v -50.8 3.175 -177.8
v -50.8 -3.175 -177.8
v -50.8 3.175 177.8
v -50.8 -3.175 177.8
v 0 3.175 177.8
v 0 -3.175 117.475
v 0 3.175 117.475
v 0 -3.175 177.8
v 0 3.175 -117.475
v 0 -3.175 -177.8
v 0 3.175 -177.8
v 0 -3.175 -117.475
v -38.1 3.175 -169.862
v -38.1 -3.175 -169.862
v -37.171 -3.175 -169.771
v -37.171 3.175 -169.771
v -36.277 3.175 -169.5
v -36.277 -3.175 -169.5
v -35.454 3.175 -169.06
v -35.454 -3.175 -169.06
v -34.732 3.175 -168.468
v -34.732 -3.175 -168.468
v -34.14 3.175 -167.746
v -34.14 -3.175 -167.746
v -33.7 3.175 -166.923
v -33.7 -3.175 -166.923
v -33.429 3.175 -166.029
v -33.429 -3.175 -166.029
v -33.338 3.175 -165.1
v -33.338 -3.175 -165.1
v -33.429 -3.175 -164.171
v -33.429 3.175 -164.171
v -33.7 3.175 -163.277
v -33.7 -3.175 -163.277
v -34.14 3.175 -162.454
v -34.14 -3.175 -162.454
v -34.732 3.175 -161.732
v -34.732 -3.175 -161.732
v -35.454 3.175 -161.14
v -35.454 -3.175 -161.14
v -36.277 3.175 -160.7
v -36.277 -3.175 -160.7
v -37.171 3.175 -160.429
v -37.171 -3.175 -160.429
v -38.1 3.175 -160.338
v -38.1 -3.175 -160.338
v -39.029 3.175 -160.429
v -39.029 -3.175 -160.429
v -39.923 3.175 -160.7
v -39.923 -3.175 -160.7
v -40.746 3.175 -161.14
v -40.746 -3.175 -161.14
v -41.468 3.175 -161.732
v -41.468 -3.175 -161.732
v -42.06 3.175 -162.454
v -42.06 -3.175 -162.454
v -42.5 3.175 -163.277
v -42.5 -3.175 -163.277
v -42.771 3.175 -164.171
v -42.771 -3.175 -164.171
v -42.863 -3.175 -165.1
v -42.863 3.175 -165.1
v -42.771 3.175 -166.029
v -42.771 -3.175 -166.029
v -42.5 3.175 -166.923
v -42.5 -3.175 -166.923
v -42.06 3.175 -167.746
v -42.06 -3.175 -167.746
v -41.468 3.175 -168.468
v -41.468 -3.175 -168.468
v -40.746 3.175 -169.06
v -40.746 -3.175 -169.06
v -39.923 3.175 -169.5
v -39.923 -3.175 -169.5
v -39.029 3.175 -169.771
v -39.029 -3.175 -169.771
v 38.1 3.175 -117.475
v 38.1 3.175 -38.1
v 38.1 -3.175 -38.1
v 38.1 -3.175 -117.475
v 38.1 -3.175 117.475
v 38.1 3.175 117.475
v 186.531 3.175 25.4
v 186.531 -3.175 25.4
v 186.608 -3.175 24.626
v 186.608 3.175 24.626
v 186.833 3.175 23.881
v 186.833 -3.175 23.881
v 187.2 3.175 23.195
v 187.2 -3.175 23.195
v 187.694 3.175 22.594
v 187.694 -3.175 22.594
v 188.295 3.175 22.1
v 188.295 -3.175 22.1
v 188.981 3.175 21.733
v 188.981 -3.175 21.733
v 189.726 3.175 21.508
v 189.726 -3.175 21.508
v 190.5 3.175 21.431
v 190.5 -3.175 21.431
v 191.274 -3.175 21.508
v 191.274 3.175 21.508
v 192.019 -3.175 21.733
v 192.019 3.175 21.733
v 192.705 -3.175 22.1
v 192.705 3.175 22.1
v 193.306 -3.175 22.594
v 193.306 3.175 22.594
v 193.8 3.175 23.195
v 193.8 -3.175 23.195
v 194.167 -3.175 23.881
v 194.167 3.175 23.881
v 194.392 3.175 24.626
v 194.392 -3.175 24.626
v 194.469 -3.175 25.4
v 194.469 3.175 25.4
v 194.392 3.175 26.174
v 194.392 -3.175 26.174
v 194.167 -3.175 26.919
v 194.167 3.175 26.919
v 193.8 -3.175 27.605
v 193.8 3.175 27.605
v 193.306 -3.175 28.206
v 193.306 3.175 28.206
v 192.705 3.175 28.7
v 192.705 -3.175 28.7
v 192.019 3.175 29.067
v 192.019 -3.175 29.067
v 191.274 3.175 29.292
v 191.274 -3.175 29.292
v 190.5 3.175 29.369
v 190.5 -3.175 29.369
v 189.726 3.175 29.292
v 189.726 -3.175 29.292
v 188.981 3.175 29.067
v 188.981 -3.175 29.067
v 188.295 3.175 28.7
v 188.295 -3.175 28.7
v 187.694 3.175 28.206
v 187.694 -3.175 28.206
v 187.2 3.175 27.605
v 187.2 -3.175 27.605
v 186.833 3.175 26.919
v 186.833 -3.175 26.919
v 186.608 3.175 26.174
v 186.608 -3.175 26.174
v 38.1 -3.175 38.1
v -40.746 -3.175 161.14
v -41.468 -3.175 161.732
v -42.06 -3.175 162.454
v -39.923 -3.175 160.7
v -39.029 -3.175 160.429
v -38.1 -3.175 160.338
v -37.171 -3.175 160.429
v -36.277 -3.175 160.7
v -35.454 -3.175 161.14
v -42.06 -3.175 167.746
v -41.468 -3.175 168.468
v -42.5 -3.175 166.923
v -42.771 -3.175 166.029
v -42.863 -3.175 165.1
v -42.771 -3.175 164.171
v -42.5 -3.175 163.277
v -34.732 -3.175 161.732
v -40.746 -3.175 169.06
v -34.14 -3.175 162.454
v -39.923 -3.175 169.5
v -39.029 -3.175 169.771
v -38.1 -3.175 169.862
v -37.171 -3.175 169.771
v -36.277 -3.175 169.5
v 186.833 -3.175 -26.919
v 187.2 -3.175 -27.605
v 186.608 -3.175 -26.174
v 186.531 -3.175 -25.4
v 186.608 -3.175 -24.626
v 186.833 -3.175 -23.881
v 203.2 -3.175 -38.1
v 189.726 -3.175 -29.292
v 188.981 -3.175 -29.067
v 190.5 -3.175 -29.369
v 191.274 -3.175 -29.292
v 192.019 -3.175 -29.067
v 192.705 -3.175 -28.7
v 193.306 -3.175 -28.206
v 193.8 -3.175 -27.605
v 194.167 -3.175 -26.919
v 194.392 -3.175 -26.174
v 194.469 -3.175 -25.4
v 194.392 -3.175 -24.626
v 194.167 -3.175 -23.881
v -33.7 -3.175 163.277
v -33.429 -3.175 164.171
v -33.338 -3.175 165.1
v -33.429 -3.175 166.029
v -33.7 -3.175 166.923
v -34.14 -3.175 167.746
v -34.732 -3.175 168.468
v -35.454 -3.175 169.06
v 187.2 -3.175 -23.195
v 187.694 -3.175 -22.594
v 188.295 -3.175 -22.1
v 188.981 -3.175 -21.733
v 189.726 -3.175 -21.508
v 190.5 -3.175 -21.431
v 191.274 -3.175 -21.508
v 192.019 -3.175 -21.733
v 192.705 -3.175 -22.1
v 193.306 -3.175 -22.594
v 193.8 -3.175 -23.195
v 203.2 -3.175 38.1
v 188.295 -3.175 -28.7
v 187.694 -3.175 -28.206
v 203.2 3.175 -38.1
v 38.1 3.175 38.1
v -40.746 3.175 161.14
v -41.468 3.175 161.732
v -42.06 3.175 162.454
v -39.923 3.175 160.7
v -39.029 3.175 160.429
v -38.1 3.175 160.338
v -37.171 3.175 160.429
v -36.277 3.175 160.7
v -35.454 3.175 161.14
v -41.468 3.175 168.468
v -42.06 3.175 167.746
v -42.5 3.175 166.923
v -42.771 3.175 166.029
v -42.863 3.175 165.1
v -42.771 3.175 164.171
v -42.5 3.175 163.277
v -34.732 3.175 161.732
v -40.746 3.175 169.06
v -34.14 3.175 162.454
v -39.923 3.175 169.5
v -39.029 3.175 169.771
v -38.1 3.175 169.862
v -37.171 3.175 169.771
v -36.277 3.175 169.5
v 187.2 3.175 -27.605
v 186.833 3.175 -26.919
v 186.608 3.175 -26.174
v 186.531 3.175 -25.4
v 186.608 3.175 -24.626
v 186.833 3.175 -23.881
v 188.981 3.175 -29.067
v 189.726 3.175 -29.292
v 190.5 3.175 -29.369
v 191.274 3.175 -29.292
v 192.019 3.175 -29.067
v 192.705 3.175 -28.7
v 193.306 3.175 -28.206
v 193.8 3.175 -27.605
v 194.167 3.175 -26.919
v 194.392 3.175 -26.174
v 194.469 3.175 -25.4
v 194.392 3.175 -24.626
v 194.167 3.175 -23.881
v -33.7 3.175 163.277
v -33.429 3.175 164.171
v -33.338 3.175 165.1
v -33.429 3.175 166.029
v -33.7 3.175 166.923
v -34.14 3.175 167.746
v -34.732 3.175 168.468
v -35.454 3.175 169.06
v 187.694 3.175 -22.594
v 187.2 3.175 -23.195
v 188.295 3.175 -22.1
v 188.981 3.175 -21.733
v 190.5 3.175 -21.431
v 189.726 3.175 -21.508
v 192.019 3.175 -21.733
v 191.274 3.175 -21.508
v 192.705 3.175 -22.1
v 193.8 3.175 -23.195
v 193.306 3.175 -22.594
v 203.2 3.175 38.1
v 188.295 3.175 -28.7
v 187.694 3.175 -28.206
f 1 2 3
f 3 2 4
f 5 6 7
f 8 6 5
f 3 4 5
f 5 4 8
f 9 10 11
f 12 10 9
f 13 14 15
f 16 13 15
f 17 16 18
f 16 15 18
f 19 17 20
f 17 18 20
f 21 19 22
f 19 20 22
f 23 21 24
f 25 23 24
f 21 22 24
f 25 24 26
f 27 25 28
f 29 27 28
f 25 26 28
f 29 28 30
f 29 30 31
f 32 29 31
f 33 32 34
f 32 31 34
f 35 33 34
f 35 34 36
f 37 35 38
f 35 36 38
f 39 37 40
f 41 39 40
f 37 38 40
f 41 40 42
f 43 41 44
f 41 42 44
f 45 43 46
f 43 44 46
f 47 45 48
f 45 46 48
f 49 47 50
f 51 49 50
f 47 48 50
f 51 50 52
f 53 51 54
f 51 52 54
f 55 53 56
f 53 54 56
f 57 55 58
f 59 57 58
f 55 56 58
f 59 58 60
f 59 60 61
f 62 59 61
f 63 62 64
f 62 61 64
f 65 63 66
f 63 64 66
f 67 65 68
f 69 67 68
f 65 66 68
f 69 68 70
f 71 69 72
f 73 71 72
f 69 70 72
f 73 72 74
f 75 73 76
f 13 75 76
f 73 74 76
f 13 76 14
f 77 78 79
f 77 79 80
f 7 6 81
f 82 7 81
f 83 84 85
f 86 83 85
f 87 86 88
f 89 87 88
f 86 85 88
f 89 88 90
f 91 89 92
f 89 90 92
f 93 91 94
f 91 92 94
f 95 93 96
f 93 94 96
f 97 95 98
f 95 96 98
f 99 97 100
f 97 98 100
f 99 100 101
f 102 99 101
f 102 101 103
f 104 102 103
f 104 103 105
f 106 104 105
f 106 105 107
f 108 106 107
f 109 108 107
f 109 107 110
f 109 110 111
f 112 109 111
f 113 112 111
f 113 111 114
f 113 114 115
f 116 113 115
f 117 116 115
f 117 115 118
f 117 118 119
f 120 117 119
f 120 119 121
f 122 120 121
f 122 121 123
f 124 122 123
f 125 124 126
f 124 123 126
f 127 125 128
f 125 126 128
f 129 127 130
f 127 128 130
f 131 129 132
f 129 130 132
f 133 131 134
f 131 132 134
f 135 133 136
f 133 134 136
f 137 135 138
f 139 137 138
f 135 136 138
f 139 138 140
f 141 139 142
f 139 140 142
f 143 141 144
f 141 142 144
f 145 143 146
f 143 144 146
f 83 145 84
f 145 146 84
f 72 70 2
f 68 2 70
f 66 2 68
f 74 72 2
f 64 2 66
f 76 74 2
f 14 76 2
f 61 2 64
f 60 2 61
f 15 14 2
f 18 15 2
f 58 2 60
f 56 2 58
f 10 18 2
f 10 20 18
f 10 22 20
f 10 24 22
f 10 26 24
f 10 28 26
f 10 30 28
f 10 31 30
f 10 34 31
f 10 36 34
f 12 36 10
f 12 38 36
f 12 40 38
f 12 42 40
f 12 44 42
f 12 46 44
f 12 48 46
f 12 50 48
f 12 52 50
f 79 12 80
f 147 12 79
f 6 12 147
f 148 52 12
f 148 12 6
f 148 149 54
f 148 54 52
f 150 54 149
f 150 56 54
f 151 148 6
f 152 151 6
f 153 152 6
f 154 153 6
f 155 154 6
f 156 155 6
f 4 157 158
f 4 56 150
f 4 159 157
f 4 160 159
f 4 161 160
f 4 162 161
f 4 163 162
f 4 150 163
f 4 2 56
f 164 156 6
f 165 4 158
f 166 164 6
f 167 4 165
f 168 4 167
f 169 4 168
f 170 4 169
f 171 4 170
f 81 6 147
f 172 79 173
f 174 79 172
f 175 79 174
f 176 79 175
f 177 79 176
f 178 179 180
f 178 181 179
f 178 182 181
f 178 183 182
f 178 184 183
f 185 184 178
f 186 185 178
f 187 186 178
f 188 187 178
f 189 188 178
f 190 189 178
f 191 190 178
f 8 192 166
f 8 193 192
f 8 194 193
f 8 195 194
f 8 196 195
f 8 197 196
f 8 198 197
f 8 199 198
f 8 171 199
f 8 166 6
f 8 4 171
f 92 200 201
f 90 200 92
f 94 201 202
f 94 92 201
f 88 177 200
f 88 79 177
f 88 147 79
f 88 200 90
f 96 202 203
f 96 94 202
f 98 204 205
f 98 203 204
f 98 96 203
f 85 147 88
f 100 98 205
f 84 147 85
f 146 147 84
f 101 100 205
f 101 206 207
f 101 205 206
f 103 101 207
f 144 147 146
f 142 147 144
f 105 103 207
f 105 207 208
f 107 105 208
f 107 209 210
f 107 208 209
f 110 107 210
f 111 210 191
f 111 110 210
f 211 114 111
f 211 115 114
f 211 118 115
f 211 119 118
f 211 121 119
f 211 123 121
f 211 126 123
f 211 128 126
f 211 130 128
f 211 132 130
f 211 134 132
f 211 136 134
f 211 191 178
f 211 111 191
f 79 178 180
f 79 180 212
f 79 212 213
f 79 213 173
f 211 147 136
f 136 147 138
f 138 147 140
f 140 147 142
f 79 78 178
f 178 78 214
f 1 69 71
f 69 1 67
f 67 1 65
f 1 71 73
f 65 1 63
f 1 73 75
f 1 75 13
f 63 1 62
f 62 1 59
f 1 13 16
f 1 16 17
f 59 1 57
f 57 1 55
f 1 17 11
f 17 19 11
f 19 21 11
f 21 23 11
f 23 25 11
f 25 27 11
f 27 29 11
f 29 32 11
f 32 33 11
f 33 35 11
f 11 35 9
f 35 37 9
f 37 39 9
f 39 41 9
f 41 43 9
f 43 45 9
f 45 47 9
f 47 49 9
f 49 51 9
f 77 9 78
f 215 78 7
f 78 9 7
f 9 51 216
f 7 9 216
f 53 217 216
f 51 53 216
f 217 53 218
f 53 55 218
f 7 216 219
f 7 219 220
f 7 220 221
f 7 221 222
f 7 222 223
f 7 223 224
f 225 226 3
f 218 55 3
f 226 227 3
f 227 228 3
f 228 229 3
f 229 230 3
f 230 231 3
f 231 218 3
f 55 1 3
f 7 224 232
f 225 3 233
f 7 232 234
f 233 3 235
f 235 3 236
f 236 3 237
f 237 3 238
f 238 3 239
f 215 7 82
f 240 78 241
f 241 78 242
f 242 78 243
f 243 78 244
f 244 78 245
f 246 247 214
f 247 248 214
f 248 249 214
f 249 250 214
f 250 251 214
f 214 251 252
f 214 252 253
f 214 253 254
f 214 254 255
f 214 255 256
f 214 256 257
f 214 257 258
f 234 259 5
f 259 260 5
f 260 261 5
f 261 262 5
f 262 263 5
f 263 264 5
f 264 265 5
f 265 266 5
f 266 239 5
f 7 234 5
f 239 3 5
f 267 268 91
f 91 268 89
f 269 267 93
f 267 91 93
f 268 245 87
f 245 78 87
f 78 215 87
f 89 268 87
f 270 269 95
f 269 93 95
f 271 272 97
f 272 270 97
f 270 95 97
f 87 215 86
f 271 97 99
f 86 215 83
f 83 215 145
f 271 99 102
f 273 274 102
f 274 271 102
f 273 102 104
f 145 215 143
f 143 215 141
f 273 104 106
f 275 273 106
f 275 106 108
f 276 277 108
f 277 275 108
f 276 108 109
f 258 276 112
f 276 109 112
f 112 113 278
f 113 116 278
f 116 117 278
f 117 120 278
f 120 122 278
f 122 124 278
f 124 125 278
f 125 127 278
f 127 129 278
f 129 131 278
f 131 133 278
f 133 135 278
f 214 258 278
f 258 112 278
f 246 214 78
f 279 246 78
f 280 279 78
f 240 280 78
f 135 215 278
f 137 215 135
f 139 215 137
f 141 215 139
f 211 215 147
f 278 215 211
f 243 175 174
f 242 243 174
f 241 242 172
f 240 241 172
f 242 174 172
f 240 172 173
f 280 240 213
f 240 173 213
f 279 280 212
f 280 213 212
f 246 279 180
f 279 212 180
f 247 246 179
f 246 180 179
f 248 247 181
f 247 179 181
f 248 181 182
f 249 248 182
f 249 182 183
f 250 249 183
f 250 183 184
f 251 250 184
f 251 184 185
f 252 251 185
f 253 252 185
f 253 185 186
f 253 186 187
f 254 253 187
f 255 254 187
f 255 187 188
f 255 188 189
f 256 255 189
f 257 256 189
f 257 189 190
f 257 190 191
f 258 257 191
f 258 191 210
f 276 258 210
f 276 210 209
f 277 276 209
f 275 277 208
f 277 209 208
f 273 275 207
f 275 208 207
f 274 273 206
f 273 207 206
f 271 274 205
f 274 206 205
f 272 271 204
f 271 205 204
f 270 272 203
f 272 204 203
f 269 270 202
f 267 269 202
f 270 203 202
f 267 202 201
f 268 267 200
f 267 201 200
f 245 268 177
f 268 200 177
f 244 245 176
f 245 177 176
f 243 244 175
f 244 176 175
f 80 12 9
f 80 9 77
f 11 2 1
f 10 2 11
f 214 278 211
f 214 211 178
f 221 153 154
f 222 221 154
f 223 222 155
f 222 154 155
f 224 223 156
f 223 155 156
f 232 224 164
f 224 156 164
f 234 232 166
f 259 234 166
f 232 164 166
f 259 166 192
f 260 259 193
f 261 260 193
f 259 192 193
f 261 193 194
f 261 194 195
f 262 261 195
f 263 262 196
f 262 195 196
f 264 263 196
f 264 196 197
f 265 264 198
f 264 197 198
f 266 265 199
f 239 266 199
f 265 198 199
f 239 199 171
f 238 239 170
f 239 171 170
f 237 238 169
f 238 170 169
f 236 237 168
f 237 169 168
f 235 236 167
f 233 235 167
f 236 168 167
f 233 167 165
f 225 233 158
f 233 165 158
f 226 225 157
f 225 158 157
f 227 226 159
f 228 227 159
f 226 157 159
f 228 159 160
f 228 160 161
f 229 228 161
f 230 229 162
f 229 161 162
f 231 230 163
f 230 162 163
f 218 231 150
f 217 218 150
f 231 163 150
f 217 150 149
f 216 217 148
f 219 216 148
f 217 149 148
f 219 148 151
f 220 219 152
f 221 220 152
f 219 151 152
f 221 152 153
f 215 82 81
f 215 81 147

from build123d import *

# Parameters (mm, degrees)
SKETCH1_W                   = 165.1
SKETCH1_H                   = 38.1
BOSS_EXTRUDE1_DEPTH         = 3.175
F_1_4_0_25_DIAMETER_HOLE1_D = 7.9375
SKETCH4_W                   = 50.8
SKETCH4_H                   = 355.6
SKETCH4_R                   = 4.7625
BOSS_EXTRUDE2_DEPTH         = 6.35
CUT_EXTRUDE1_REACH          = 272.08
SKETCH5_W                   = 38.1
SKETCH5_H                   = 60.325


with BuildPart() as part:
    # Sketch1 → Boss-Extrude1 (new, symmetric)
    with BuildSketch(Plane(origin=(0, 0, 0), x_dir=(1, 0, 0), z_dir=(0, 1, 0))):
        Polygon((0, 0), (0, -177.8), (38.1, -177.8), (38.1, -38.1), (38.1, 0), align=None)
        with Locations((120.65, -19.05)):
            Rectangle(SKETCH1_W, SKETCH1_H)
        with Locations((120.65, 19.05)):
            Rectangle(SKETCH1_W, SKETCH1_H)
        Polygon((0, 177.8), (0, 0), (38.1, 0), (38.1, 38.1), (38.1, 177.8), align=None)
    extrude(amount=BOSS_EXTRUDE1_DEPTH, both=True)

    # 1/4 (0.25) Diameter Hole1 (through all)
    with Locations(Plane(origin=(0, 3.175, 0), x_dir=(1, 0, 0), z_dir=(0, 1, 0))):
        with Locations((190.5, 25.4), (190.5, -25.4)):
            Hole(F_1_4_0_25_DIAMETER_HOLE1_D / 2)

    # Sketch4 → Boss-Extrude2 (add)
    with BuildSketch(Plane.XZ.offset(3.175)):
        with Locations((-25.4, 0)):
            Rectangle(SKETCH4_W, SKETCH4_H)
        with Locations(Location((-38.1, -165.1, 0), (0, 0, 270))):
            Circle(SKETCH4_R, mode=Mode.SUBTRACT)
        with Locations(Location((-38.1, 165.1, 0), (0, 0, 270))):
            Circle(SKETCH4_R, mode=Mode.SUBTRACT)
    extrude(amount=-BOSS_EXTRUDE2_DEPTH)

    # Sketch5 → Cut-Extrude1 (cut, up to next)
    with BuildSketch(Plane.XZ.offset(3.175), mode=Mode.PRIVATE) as cut_extrude1_sk1:
        with Locations((19.05, 147.6375)):
            Rectangle(SKETCH5_W, SKETCH5_H)
    cut_extrude1_tool1 = extrude(cut_extrude1_sk1.sketch, amount=-CUT_EXTRUDE1_REACH, mode=Mode.PRIVATE) & part.part
    # Sketch5 → Cut-Extrude1 (cut, up to next)
    with BuildSketch(Plane.XZ.offset(3.175), mode=Mode.PRIVATE) as cut_extrude1_sk2:
        with Locations((19.05, -147.6375)):
            Rectangle(SKETCH5_W, SKETCH5_H)
    cut_extrude1_tool2 = extrude(cut_extrude1_sk2.sketch, amount=-CUT_EXTRUDE1_REACH, mode=Mode.PRIVATE) & part.part
    add(cut_extrude1_tool1.solids().sort_by_distance((19.05, -3.175, 147.6375))[0], mode=Mode.SUBTRACT)
    add(cut_extrude1_tool2.solids().sort_by_distance((19.05, -3.175, -147.6375))[0], mode=Mode.SUBTRACT)


solid = part.part
